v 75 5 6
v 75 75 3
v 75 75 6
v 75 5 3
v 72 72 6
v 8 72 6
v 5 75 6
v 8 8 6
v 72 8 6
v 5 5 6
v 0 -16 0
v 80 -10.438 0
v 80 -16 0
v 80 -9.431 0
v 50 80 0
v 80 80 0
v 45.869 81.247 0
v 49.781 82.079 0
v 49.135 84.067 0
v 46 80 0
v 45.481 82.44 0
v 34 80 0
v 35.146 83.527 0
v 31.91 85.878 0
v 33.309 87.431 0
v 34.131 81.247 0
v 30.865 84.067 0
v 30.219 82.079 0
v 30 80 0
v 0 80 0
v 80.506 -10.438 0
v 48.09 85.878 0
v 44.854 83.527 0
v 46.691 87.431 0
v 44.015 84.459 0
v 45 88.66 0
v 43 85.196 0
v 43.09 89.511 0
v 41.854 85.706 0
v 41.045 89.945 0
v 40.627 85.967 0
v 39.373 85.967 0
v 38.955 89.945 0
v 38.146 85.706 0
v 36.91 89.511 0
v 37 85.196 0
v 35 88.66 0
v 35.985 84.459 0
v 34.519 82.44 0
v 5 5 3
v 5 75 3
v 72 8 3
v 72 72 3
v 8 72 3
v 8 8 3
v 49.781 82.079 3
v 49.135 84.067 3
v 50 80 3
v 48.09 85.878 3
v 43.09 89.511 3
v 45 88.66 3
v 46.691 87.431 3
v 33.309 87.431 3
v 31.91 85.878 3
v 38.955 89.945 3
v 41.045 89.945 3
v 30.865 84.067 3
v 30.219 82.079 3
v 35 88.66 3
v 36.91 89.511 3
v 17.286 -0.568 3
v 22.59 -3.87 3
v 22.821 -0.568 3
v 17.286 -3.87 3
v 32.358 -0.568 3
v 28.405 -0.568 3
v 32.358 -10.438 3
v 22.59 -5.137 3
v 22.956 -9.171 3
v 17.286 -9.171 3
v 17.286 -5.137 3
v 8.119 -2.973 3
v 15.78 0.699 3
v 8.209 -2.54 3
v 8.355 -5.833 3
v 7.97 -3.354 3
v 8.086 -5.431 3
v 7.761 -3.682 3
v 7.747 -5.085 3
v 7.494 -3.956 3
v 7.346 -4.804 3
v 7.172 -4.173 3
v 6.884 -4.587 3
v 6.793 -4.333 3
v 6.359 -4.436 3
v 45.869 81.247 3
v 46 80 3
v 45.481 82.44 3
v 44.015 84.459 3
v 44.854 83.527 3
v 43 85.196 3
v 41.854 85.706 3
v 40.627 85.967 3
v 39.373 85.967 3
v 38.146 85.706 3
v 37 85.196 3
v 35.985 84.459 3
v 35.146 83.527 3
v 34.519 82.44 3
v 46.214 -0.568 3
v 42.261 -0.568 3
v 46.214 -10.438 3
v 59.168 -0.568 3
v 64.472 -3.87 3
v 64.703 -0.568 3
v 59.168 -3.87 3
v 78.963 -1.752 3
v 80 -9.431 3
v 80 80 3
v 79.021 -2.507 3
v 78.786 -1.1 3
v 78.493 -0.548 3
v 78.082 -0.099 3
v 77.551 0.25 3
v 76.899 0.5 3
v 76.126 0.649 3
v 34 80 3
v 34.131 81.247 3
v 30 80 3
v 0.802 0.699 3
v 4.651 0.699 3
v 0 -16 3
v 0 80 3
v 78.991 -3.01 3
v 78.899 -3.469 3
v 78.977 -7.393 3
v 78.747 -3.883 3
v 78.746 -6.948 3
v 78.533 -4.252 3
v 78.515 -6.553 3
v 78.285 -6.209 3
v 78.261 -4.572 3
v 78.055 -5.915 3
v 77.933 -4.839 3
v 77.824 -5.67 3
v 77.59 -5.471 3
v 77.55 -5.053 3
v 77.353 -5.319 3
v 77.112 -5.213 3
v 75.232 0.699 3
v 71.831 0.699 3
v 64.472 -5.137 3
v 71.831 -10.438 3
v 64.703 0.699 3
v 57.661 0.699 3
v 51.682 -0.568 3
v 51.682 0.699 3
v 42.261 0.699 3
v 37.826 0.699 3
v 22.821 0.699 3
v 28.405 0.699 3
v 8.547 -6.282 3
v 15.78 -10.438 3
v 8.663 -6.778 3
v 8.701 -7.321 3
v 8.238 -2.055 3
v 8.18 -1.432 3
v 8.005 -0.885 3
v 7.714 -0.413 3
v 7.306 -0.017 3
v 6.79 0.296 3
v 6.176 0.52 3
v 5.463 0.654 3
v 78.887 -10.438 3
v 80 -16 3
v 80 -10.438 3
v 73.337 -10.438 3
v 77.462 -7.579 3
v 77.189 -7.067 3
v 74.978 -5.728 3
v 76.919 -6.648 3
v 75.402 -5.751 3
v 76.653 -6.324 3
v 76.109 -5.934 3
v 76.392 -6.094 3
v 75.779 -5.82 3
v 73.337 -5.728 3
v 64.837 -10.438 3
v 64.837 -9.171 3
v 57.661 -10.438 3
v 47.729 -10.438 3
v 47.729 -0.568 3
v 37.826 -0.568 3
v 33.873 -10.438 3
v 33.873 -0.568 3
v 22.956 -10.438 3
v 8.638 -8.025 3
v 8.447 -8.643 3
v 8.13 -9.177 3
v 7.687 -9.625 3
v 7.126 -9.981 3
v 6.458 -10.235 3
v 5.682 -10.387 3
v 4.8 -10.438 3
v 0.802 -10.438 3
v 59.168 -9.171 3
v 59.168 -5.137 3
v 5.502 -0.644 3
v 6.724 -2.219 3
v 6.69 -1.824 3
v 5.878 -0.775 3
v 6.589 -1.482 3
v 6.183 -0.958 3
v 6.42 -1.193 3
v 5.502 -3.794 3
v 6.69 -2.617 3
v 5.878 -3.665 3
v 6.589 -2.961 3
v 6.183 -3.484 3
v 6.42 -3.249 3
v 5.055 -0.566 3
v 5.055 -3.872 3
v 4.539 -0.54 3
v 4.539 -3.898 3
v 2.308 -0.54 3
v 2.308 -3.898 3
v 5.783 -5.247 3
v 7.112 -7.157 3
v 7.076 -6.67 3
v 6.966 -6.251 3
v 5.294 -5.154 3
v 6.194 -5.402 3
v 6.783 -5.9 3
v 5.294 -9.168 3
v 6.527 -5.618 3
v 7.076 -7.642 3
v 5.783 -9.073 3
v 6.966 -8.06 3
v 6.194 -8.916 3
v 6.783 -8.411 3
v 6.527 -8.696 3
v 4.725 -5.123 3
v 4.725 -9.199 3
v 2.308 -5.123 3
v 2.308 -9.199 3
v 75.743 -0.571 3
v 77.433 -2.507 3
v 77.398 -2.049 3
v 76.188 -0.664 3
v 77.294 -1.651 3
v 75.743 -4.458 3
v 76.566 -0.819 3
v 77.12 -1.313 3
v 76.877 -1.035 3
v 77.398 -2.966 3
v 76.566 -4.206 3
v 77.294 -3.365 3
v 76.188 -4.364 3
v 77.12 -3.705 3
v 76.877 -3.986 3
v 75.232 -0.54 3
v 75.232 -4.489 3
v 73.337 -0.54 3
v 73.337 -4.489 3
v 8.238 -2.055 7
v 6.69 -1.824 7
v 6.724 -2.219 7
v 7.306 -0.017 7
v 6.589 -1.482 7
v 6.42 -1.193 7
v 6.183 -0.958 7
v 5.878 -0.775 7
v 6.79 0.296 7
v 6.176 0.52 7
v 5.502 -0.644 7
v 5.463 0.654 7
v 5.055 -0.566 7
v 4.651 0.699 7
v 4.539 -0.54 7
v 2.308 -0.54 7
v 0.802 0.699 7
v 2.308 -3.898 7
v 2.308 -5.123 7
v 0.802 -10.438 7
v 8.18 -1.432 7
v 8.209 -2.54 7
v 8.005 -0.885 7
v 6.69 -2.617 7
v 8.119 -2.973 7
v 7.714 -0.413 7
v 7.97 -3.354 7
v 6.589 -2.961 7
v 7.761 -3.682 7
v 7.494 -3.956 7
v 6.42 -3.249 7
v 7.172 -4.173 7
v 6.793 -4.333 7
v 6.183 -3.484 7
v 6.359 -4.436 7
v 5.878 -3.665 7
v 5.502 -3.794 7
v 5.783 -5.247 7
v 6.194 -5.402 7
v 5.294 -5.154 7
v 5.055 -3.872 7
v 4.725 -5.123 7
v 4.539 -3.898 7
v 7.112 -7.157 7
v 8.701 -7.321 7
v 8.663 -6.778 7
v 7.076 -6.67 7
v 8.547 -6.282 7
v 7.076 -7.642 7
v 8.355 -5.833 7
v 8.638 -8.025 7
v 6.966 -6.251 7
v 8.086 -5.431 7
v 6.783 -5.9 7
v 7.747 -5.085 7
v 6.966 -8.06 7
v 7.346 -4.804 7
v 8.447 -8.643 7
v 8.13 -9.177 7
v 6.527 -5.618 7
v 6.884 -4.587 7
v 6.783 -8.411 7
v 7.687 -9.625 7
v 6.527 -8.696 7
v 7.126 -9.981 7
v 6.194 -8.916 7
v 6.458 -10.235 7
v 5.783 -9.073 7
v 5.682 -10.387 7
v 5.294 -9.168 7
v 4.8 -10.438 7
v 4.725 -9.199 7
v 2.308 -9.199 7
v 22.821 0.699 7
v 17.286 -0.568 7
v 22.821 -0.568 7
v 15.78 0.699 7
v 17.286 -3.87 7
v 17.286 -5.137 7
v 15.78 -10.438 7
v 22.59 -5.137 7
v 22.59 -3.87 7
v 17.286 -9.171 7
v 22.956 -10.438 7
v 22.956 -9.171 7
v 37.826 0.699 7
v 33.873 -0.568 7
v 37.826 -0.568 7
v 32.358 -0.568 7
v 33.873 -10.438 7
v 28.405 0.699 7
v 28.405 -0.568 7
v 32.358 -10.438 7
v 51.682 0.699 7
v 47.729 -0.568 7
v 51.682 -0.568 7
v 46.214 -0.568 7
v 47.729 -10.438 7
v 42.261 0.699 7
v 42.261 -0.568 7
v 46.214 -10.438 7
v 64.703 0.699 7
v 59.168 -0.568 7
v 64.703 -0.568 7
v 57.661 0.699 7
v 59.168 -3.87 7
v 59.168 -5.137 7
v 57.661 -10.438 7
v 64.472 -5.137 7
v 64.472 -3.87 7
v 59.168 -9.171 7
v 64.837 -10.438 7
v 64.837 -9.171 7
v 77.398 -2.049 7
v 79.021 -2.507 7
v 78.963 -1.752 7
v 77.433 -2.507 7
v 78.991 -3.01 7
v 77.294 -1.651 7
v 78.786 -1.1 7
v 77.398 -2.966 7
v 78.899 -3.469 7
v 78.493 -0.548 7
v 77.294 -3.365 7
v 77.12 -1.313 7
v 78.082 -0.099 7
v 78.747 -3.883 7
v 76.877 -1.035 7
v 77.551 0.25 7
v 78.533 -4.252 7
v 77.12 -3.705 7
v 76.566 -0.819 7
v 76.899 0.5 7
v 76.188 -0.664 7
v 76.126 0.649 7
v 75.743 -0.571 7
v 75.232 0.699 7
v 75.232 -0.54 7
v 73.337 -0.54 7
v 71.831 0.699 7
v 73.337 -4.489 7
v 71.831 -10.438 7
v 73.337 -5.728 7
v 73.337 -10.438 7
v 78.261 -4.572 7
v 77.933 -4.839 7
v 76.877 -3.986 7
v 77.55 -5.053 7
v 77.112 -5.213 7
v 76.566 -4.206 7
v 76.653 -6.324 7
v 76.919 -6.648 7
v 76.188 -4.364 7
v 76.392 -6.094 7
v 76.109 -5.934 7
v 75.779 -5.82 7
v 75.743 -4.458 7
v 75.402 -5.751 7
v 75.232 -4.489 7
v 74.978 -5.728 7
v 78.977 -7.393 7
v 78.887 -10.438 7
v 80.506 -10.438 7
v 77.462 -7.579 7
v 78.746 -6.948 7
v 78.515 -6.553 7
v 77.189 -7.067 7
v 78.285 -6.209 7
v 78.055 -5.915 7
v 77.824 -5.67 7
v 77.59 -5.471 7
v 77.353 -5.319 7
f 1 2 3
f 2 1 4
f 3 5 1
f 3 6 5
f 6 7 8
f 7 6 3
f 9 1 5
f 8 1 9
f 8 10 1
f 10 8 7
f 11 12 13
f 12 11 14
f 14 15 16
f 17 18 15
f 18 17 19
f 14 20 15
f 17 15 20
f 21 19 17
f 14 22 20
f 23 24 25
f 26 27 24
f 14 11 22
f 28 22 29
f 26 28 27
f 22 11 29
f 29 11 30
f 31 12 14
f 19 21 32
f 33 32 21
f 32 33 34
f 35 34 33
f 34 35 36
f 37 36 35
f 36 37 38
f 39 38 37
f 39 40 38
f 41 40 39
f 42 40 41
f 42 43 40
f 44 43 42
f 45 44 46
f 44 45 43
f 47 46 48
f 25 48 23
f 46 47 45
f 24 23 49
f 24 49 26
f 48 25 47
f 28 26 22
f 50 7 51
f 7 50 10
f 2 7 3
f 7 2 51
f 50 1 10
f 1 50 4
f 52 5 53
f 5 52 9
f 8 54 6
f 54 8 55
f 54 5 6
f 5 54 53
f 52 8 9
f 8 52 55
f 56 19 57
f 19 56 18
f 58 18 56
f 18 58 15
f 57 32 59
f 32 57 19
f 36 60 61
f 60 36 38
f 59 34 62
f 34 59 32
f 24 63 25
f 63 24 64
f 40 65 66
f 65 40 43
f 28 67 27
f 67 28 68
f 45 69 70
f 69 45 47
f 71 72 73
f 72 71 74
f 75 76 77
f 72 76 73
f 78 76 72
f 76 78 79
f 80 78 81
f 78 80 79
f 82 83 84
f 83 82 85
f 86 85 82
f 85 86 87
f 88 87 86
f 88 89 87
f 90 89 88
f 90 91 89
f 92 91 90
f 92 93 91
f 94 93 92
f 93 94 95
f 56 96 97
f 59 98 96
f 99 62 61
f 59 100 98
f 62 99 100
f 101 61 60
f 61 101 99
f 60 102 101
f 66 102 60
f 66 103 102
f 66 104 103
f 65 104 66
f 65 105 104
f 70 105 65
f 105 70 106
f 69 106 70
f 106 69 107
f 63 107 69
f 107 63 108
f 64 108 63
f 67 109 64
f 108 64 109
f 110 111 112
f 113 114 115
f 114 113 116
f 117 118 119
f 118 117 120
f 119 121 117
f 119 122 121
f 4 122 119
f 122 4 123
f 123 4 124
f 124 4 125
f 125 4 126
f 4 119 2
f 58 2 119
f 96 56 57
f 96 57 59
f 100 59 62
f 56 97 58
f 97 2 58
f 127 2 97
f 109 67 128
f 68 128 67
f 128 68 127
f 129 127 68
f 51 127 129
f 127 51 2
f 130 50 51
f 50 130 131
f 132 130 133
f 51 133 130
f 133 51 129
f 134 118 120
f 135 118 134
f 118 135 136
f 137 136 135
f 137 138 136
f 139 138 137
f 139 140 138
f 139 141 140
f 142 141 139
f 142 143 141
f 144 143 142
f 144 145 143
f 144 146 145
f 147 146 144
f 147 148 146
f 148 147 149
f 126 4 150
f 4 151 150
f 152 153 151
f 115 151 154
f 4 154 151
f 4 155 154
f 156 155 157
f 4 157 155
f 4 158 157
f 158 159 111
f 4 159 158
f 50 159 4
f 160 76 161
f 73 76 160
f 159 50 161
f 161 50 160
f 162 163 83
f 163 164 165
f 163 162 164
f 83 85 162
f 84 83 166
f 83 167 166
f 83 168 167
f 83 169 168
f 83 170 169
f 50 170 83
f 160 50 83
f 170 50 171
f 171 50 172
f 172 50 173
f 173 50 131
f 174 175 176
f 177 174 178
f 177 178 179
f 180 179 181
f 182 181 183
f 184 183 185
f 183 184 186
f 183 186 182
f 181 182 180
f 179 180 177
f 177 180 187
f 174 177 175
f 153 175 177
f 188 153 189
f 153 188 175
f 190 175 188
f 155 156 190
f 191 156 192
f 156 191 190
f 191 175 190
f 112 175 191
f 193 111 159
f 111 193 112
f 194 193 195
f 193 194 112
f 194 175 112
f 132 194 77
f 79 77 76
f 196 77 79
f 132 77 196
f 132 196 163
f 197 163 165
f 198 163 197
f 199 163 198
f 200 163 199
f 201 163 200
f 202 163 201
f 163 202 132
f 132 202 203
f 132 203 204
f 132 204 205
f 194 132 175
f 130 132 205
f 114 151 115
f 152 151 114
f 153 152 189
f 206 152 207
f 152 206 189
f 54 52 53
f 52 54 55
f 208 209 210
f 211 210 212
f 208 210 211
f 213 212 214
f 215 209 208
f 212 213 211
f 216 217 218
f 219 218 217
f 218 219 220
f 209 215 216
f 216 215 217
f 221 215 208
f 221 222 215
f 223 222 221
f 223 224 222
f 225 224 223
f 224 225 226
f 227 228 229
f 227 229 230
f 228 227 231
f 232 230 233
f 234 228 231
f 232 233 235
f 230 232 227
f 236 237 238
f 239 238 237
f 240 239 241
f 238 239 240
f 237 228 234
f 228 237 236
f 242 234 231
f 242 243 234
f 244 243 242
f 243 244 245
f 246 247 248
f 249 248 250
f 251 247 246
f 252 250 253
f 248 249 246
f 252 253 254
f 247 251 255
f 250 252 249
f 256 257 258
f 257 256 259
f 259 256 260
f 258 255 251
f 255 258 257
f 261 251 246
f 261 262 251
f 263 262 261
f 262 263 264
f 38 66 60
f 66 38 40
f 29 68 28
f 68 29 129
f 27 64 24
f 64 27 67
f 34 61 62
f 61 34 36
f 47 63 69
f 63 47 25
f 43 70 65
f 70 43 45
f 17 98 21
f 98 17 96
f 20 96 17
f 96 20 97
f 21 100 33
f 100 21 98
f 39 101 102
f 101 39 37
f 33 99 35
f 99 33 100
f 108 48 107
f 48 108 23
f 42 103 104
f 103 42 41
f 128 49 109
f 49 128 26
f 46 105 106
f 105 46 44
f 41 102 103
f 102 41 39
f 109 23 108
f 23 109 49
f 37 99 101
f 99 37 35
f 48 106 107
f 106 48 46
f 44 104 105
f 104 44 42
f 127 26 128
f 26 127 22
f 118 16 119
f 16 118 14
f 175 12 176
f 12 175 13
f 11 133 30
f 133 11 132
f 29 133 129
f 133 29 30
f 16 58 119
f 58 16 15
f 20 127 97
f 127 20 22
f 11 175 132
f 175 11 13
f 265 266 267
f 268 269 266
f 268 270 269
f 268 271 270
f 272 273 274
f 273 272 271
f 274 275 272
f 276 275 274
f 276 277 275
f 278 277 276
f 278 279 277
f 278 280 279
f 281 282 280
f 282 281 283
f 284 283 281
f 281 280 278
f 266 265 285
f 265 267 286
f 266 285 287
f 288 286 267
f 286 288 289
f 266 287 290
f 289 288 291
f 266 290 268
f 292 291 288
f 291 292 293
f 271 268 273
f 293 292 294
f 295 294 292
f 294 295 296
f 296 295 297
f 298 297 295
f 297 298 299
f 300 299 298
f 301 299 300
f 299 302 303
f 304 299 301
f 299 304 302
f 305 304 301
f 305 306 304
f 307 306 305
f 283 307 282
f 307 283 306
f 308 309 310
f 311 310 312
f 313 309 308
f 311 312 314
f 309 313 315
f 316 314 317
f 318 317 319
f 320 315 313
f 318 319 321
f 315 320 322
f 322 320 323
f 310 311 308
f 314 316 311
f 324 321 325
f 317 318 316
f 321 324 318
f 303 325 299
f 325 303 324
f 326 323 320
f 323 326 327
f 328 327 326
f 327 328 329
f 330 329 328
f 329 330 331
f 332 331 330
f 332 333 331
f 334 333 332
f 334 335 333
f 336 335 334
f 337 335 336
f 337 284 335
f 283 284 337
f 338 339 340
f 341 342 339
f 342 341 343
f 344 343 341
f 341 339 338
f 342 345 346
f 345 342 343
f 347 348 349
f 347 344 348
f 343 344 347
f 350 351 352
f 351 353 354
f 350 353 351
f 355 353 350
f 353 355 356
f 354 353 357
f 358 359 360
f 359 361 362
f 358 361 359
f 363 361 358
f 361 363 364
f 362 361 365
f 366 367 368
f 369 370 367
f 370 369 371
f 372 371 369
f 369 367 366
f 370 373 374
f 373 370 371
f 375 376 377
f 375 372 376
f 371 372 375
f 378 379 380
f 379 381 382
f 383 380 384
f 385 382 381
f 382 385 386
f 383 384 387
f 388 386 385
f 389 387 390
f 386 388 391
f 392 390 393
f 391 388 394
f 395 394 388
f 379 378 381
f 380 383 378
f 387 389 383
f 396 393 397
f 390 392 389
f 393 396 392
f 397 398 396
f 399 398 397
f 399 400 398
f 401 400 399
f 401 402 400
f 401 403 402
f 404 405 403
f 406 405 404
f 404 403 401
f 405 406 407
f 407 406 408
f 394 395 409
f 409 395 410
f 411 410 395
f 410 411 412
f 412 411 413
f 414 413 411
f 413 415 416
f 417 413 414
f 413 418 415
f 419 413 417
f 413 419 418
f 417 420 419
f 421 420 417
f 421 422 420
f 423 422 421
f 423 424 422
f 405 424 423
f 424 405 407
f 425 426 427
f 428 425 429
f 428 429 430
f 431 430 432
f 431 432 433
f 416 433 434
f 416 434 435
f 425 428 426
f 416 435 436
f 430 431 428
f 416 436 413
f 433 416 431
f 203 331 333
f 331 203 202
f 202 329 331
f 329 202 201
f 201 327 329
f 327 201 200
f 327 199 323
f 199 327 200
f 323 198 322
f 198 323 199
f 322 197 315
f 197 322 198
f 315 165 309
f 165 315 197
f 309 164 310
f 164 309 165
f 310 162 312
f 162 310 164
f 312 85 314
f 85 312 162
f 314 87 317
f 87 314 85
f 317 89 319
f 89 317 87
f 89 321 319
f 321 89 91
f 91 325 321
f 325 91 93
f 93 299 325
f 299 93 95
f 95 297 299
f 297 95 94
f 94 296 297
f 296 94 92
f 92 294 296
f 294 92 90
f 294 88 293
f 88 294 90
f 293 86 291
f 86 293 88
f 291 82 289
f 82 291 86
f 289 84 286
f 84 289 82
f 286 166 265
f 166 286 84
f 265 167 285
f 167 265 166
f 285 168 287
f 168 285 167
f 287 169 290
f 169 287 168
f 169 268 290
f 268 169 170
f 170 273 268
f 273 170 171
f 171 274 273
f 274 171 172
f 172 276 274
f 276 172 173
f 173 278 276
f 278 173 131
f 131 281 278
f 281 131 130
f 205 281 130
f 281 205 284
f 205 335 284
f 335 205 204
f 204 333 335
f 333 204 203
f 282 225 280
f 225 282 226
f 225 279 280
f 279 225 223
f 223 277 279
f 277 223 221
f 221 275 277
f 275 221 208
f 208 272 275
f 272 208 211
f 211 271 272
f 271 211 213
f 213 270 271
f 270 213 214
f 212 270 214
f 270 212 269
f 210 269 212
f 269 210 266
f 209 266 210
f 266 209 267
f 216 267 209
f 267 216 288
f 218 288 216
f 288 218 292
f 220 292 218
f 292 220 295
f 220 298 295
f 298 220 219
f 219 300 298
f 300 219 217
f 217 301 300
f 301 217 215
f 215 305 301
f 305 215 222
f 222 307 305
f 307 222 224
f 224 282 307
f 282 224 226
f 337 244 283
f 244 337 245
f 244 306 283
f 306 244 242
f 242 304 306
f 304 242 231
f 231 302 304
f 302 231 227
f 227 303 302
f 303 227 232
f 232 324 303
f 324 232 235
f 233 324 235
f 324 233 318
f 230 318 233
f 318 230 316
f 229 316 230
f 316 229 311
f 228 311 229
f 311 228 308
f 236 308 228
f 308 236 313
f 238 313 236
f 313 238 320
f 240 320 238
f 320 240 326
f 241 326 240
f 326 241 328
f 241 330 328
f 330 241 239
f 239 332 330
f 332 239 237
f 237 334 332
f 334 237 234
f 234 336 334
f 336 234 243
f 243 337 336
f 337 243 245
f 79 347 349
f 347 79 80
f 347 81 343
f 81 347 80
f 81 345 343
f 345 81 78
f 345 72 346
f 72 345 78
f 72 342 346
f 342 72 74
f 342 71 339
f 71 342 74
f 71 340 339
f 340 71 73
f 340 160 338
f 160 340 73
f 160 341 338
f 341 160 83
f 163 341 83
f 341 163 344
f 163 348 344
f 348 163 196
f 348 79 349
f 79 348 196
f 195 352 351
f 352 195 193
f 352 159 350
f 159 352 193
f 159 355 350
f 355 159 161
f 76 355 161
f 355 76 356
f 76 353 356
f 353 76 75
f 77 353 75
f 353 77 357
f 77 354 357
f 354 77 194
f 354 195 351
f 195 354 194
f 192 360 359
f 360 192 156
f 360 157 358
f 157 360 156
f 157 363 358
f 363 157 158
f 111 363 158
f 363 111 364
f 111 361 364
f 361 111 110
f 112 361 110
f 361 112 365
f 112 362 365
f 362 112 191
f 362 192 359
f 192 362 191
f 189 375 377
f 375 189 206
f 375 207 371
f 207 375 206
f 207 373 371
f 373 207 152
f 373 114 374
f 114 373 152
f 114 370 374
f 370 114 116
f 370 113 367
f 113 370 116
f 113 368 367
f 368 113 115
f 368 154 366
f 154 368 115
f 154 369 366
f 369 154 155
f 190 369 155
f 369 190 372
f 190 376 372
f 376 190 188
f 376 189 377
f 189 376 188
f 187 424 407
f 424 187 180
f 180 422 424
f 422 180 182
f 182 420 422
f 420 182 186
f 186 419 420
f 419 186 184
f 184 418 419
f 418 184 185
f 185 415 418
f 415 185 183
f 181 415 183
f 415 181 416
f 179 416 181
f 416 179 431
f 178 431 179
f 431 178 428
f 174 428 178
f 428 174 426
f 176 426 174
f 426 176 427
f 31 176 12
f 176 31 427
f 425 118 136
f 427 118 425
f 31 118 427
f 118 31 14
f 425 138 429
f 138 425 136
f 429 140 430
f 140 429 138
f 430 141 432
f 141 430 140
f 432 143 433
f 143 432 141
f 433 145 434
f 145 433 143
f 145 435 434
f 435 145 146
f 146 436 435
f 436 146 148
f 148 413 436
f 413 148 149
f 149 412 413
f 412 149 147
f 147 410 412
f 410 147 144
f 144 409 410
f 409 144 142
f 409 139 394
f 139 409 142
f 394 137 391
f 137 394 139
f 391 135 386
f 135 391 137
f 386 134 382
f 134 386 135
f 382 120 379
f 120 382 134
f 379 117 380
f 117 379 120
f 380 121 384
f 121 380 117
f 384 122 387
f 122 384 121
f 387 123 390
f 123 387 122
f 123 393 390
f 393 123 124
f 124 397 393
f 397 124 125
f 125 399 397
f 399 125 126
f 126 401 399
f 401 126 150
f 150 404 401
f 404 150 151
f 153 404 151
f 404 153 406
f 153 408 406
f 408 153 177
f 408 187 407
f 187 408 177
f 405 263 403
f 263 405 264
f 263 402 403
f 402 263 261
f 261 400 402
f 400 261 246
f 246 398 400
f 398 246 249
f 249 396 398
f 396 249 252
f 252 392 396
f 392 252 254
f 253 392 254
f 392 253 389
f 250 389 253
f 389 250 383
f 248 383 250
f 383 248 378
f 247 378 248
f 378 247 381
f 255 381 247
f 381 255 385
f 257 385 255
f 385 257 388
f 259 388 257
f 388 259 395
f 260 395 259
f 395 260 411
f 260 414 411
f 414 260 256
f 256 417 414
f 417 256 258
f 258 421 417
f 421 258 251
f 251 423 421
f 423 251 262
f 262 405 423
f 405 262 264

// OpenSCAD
$fn=30;

size = 80;
height = 3;
edge = 5;
text_shift = 16;

union() {
    translate([0, -text_shift, 0]) {
        cube([size, size + text_shift, height]);
    }
    translate([edge, edge, 0]) {
        difference() {
            cube([size - edge * 2, size - edge * 2, height * 2]);
            translate([height, height, 0]) {
                cube([size - edge * 2 - 6 , size - edge * 2 - 6, height * 2]);
            }
        }
    }
    //handle
    translate([size/2, size, 0]) {
        difference() {
            cylinder(r = 10, h = height);
            cylinder(r = 6, h = height);
        }
    }
}

translate([size/2, -5, 0]) {
    linear_extrude(height = 7) {
        //using spaces for spacing as spacing = 2 messes it up
        text(text = "B E T T E R", font = "Flama Basic", halign = "center", valign = "center", spacing = 1, size = 11);
    }
}
